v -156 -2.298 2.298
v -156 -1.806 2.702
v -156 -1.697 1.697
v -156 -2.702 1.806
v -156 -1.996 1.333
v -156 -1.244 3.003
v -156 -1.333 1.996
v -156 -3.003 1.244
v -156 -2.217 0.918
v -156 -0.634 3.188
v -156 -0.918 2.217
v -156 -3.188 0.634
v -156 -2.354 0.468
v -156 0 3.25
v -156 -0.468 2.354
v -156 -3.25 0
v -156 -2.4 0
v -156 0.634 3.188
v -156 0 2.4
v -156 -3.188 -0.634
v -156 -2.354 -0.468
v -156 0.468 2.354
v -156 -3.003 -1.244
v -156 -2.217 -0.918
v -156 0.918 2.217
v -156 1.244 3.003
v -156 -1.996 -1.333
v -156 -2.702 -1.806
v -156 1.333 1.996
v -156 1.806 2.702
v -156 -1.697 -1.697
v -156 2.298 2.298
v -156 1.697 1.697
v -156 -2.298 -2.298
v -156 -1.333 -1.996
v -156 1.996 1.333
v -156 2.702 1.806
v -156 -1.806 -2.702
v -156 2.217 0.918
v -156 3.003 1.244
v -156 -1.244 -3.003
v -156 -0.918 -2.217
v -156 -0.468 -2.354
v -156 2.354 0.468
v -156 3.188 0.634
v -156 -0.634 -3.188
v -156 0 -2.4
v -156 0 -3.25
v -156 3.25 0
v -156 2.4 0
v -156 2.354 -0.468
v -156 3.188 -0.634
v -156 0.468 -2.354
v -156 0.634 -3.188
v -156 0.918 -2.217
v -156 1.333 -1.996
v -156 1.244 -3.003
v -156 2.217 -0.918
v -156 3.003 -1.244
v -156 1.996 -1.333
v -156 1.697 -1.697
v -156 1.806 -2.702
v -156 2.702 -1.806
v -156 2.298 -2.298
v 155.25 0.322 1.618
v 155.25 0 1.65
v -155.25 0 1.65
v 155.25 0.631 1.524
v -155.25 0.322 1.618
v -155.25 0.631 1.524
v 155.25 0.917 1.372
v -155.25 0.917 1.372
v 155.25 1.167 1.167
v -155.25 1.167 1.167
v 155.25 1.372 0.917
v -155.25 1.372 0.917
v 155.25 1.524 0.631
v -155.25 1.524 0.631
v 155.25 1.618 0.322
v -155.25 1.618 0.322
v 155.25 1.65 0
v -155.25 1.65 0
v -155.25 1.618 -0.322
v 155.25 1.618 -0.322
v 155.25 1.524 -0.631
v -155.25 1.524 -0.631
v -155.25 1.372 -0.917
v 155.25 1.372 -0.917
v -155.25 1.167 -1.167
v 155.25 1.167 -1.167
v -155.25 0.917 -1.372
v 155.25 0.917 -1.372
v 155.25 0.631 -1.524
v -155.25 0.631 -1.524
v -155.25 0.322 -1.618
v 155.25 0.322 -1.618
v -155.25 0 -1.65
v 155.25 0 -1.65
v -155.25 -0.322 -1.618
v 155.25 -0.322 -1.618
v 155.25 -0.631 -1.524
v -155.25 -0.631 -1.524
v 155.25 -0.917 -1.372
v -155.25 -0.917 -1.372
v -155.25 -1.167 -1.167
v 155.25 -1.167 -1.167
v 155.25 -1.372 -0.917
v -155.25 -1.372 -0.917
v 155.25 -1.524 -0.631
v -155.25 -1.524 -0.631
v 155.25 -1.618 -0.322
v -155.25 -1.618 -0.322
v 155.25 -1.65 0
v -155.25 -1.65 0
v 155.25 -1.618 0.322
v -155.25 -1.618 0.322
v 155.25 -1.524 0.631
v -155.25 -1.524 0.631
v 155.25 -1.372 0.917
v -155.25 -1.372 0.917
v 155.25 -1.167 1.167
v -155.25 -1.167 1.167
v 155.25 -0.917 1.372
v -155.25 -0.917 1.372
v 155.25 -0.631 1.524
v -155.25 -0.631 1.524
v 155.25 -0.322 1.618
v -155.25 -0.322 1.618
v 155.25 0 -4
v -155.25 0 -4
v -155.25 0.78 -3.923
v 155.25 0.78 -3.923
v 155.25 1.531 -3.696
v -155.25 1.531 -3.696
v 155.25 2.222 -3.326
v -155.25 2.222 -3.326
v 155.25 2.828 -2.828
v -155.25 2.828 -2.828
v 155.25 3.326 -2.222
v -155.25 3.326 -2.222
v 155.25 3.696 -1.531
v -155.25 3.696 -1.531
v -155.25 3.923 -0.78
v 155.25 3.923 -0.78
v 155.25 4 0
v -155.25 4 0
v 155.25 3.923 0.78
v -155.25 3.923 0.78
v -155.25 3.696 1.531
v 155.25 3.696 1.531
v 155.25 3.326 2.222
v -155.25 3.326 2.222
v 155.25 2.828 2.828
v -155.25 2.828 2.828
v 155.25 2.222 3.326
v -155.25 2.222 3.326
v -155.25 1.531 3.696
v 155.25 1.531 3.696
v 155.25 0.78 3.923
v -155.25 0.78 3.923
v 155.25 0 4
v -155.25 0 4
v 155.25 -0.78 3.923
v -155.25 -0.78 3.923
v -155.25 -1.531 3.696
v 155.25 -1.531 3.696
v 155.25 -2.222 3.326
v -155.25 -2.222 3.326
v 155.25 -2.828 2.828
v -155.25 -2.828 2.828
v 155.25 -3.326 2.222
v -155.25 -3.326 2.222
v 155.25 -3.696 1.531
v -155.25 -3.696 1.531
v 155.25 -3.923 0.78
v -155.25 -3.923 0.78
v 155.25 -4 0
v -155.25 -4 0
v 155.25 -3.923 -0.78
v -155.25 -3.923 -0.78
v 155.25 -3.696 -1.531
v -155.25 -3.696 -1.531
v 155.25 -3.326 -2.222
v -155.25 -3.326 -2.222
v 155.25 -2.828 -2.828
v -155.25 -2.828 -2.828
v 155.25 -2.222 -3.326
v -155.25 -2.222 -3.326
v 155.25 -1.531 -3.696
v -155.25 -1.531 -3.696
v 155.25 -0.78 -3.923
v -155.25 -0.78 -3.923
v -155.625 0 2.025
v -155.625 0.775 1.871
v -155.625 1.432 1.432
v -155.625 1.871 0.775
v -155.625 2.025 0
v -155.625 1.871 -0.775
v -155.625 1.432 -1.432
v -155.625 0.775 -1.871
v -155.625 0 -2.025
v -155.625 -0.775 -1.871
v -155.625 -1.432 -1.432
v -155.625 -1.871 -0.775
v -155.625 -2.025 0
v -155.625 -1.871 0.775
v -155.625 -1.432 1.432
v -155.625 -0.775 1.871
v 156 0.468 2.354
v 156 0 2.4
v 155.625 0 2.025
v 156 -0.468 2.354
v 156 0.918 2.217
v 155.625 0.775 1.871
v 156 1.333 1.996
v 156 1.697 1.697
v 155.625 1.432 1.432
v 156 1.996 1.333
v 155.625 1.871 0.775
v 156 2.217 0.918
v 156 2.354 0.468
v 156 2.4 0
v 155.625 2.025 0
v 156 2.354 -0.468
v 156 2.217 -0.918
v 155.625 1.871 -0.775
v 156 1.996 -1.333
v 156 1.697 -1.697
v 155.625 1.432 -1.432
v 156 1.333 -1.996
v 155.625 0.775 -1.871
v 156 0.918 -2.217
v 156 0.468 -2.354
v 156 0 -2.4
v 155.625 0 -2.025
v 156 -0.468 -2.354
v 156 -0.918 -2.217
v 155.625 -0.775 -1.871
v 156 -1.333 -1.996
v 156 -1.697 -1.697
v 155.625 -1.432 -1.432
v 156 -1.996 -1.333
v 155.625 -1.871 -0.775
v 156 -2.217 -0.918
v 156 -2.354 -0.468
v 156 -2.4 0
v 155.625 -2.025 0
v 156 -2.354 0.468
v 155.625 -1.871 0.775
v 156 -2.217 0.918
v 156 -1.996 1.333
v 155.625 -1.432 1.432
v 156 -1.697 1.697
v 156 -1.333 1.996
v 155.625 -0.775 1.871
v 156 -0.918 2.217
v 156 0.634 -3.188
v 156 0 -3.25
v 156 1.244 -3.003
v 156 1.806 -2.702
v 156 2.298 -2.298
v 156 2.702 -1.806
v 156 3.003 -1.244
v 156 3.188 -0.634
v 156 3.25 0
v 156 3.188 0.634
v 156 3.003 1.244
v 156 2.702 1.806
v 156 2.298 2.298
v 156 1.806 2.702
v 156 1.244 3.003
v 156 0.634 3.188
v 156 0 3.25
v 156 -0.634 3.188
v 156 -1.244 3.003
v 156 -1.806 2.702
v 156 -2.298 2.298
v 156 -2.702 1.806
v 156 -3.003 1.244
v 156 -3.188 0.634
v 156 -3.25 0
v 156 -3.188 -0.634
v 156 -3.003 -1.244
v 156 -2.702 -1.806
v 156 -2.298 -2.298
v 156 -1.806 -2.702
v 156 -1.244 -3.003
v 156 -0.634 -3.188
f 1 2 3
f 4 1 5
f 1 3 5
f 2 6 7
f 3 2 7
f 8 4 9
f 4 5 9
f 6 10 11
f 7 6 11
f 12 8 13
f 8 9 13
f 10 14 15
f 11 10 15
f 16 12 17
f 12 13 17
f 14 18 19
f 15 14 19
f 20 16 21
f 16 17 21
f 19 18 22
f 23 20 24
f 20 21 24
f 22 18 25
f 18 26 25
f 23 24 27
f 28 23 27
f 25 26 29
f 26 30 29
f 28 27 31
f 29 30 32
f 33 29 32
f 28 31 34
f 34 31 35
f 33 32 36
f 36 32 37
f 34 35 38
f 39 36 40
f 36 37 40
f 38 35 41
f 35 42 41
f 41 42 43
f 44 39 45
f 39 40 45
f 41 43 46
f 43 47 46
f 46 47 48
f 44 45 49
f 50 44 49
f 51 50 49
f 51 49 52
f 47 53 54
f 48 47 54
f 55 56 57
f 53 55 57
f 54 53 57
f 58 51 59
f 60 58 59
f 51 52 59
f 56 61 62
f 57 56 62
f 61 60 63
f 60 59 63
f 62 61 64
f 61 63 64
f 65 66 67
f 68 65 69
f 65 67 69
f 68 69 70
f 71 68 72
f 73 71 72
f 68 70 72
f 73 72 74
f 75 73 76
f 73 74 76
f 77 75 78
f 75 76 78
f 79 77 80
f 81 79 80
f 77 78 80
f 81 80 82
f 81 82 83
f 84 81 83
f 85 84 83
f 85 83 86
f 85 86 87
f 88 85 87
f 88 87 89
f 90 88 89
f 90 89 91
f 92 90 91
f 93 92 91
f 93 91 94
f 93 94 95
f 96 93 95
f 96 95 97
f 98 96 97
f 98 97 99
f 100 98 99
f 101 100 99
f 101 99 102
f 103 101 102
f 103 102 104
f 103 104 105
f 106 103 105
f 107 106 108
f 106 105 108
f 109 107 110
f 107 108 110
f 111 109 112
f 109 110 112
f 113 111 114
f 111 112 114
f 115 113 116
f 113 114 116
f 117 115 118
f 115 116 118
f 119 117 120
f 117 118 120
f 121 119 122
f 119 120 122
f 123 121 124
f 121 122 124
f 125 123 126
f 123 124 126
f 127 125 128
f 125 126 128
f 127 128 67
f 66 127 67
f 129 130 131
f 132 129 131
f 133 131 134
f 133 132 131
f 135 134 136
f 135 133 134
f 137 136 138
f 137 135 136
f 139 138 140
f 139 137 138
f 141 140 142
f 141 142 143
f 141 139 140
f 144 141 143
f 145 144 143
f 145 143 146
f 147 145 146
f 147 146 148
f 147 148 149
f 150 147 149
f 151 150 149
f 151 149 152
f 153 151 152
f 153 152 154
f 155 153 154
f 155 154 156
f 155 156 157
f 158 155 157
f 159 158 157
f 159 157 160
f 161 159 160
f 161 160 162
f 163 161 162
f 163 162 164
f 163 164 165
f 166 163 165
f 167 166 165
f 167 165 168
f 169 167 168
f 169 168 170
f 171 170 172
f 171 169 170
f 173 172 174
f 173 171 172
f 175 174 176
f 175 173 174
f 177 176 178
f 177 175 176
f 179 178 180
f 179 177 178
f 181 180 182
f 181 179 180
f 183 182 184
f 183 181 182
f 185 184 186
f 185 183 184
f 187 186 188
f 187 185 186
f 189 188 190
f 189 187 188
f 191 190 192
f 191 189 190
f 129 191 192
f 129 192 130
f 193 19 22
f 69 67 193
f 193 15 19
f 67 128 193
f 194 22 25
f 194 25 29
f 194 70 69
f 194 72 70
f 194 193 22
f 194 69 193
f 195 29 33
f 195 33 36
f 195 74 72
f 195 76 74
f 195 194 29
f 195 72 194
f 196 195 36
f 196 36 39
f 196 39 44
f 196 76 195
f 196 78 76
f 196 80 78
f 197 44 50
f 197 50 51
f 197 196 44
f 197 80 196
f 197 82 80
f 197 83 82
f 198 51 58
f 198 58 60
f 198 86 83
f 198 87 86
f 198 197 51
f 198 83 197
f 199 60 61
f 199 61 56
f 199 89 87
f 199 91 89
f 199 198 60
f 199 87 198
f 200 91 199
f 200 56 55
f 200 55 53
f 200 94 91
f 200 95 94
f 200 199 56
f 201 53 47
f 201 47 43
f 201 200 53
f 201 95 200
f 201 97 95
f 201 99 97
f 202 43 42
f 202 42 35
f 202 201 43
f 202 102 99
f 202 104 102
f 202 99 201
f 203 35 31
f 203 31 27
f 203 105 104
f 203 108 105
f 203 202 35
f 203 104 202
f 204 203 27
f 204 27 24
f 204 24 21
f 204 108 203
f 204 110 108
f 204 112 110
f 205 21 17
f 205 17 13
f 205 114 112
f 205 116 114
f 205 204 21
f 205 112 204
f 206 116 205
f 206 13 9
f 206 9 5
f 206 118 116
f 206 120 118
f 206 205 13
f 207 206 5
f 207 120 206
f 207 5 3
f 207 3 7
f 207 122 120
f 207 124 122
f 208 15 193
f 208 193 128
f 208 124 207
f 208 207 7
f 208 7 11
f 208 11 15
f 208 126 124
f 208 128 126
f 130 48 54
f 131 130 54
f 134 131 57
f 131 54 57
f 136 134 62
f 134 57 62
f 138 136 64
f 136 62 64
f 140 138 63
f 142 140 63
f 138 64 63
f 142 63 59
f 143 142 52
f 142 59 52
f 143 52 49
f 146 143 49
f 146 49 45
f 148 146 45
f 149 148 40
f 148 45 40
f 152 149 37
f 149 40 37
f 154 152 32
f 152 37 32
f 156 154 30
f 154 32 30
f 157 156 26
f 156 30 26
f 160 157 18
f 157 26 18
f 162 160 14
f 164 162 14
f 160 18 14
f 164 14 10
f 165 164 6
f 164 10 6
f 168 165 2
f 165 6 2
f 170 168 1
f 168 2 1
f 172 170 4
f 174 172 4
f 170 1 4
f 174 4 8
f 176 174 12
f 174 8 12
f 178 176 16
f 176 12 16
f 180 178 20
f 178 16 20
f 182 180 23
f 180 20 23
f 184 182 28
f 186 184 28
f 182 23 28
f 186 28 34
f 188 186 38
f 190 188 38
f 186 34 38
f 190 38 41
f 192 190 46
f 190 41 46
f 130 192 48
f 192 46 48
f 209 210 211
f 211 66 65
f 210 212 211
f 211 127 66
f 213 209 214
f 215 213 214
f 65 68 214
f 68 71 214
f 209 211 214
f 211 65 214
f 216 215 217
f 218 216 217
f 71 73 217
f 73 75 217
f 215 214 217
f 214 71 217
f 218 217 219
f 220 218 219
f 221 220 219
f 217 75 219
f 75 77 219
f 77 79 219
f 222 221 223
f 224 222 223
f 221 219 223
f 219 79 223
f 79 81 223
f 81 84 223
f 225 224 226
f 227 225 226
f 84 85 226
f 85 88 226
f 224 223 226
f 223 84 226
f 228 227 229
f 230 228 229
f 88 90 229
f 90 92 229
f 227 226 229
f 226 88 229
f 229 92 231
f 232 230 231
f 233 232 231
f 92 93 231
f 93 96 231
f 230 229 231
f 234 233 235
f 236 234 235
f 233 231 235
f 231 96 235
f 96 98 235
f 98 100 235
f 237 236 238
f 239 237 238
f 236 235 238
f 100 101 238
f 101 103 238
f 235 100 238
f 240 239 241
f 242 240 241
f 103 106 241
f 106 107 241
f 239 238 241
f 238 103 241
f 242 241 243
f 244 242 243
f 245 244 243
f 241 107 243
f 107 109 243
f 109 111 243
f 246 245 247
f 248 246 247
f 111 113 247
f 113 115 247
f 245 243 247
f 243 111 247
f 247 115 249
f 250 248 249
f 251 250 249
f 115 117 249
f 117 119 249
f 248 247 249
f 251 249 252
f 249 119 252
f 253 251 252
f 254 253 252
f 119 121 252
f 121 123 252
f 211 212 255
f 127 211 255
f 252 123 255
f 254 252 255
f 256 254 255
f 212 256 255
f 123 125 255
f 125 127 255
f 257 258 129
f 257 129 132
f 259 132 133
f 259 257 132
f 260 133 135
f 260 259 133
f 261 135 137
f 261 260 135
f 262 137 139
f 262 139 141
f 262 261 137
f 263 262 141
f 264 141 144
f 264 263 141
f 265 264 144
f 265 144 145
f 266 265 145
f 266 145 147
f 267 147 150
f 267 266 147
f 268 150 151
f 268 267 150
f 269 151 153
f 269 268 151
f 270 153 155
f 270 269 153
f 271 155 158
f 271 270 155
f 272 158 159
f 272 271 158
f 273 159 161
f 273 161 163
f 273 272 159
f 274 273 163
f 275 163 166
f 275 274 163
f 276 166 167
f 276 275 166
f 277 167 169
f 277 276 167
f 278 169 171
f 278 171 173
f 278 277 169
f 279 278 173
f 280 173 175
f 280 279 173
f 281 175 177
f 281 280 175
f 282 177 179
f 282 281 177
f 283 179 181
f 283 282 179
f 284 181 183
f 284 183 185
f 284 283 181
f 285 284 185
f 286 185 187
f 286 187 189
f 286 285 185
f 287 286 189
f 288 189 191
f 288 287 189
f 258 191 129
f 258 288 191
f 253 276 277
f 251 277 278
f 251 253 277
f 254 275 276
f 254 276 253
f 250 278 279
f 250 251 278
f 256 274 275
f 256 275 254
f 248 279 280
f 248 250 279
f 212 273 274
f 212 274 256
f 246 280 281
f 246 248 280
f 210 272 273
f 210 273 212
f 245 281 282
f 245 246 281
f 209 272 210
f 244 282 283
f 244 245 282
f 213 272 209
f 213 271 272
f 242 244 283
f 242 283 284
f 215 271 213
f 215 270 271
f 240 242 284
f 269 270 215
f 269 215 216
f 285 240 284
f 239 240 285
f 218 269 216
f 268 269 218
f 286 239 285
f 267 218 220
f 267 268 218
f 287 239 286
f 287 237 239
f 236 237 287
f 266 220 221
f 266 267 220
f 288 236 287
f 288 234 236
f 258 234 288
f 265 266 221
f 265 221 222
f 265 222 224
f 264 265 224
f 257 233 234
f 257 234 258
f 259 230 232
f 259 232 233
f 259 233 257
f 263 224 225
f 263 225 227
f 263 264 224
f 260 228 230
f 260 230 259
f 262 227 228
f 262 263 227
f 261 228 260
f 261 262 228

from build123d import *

# Parameters (mm, degrees)
ESQUISSE1_R             = 4
BOSS_EXTRU_1_DEPTH      = 156
ESQUISSE2_R             = 1.65
ENL_V_MAT_EXTRU_1_DEPTH = 313
CHANFREIN1_SIZE         = 0.75


with BuildPart() as part:
    # Esquisse1 → Boss.-Extru.1 (new body, symmetric)
    with BuildSketch(Plane(origin=(0, 0, 0), x_dir=(0, 0, -1), z_dir=(1, 0, 0))):
        Circle(ESQUISSE1_R)
    extrude(amount=BOSS_EXTRU_1_DEPTH, both=True)

    # Esquisse2 → Enlèv. mat.-Extru.1 (cut, through all)
    with BuildSketch(Plane.ZY.offset(156)):
        Circle(ESQUISSE2_R)
    extrude(amount=-ENL_V_MAT_EXTRU_1_DEPTH, mode=Mode.SUBTRACT)

    # Chanfrein1
    chanfrein1_edges = [part.edges().sort_by_distance(p)[0] for p in [
        (-156, 0, 4),
        (156, 0, 4),
        (156, 0, -1.65),
        (-156, 0, -1.65),
    ]]
    chamfer(chanfrein1_edges, length=CHANFREIN1_SIZE)


solid = part.part
